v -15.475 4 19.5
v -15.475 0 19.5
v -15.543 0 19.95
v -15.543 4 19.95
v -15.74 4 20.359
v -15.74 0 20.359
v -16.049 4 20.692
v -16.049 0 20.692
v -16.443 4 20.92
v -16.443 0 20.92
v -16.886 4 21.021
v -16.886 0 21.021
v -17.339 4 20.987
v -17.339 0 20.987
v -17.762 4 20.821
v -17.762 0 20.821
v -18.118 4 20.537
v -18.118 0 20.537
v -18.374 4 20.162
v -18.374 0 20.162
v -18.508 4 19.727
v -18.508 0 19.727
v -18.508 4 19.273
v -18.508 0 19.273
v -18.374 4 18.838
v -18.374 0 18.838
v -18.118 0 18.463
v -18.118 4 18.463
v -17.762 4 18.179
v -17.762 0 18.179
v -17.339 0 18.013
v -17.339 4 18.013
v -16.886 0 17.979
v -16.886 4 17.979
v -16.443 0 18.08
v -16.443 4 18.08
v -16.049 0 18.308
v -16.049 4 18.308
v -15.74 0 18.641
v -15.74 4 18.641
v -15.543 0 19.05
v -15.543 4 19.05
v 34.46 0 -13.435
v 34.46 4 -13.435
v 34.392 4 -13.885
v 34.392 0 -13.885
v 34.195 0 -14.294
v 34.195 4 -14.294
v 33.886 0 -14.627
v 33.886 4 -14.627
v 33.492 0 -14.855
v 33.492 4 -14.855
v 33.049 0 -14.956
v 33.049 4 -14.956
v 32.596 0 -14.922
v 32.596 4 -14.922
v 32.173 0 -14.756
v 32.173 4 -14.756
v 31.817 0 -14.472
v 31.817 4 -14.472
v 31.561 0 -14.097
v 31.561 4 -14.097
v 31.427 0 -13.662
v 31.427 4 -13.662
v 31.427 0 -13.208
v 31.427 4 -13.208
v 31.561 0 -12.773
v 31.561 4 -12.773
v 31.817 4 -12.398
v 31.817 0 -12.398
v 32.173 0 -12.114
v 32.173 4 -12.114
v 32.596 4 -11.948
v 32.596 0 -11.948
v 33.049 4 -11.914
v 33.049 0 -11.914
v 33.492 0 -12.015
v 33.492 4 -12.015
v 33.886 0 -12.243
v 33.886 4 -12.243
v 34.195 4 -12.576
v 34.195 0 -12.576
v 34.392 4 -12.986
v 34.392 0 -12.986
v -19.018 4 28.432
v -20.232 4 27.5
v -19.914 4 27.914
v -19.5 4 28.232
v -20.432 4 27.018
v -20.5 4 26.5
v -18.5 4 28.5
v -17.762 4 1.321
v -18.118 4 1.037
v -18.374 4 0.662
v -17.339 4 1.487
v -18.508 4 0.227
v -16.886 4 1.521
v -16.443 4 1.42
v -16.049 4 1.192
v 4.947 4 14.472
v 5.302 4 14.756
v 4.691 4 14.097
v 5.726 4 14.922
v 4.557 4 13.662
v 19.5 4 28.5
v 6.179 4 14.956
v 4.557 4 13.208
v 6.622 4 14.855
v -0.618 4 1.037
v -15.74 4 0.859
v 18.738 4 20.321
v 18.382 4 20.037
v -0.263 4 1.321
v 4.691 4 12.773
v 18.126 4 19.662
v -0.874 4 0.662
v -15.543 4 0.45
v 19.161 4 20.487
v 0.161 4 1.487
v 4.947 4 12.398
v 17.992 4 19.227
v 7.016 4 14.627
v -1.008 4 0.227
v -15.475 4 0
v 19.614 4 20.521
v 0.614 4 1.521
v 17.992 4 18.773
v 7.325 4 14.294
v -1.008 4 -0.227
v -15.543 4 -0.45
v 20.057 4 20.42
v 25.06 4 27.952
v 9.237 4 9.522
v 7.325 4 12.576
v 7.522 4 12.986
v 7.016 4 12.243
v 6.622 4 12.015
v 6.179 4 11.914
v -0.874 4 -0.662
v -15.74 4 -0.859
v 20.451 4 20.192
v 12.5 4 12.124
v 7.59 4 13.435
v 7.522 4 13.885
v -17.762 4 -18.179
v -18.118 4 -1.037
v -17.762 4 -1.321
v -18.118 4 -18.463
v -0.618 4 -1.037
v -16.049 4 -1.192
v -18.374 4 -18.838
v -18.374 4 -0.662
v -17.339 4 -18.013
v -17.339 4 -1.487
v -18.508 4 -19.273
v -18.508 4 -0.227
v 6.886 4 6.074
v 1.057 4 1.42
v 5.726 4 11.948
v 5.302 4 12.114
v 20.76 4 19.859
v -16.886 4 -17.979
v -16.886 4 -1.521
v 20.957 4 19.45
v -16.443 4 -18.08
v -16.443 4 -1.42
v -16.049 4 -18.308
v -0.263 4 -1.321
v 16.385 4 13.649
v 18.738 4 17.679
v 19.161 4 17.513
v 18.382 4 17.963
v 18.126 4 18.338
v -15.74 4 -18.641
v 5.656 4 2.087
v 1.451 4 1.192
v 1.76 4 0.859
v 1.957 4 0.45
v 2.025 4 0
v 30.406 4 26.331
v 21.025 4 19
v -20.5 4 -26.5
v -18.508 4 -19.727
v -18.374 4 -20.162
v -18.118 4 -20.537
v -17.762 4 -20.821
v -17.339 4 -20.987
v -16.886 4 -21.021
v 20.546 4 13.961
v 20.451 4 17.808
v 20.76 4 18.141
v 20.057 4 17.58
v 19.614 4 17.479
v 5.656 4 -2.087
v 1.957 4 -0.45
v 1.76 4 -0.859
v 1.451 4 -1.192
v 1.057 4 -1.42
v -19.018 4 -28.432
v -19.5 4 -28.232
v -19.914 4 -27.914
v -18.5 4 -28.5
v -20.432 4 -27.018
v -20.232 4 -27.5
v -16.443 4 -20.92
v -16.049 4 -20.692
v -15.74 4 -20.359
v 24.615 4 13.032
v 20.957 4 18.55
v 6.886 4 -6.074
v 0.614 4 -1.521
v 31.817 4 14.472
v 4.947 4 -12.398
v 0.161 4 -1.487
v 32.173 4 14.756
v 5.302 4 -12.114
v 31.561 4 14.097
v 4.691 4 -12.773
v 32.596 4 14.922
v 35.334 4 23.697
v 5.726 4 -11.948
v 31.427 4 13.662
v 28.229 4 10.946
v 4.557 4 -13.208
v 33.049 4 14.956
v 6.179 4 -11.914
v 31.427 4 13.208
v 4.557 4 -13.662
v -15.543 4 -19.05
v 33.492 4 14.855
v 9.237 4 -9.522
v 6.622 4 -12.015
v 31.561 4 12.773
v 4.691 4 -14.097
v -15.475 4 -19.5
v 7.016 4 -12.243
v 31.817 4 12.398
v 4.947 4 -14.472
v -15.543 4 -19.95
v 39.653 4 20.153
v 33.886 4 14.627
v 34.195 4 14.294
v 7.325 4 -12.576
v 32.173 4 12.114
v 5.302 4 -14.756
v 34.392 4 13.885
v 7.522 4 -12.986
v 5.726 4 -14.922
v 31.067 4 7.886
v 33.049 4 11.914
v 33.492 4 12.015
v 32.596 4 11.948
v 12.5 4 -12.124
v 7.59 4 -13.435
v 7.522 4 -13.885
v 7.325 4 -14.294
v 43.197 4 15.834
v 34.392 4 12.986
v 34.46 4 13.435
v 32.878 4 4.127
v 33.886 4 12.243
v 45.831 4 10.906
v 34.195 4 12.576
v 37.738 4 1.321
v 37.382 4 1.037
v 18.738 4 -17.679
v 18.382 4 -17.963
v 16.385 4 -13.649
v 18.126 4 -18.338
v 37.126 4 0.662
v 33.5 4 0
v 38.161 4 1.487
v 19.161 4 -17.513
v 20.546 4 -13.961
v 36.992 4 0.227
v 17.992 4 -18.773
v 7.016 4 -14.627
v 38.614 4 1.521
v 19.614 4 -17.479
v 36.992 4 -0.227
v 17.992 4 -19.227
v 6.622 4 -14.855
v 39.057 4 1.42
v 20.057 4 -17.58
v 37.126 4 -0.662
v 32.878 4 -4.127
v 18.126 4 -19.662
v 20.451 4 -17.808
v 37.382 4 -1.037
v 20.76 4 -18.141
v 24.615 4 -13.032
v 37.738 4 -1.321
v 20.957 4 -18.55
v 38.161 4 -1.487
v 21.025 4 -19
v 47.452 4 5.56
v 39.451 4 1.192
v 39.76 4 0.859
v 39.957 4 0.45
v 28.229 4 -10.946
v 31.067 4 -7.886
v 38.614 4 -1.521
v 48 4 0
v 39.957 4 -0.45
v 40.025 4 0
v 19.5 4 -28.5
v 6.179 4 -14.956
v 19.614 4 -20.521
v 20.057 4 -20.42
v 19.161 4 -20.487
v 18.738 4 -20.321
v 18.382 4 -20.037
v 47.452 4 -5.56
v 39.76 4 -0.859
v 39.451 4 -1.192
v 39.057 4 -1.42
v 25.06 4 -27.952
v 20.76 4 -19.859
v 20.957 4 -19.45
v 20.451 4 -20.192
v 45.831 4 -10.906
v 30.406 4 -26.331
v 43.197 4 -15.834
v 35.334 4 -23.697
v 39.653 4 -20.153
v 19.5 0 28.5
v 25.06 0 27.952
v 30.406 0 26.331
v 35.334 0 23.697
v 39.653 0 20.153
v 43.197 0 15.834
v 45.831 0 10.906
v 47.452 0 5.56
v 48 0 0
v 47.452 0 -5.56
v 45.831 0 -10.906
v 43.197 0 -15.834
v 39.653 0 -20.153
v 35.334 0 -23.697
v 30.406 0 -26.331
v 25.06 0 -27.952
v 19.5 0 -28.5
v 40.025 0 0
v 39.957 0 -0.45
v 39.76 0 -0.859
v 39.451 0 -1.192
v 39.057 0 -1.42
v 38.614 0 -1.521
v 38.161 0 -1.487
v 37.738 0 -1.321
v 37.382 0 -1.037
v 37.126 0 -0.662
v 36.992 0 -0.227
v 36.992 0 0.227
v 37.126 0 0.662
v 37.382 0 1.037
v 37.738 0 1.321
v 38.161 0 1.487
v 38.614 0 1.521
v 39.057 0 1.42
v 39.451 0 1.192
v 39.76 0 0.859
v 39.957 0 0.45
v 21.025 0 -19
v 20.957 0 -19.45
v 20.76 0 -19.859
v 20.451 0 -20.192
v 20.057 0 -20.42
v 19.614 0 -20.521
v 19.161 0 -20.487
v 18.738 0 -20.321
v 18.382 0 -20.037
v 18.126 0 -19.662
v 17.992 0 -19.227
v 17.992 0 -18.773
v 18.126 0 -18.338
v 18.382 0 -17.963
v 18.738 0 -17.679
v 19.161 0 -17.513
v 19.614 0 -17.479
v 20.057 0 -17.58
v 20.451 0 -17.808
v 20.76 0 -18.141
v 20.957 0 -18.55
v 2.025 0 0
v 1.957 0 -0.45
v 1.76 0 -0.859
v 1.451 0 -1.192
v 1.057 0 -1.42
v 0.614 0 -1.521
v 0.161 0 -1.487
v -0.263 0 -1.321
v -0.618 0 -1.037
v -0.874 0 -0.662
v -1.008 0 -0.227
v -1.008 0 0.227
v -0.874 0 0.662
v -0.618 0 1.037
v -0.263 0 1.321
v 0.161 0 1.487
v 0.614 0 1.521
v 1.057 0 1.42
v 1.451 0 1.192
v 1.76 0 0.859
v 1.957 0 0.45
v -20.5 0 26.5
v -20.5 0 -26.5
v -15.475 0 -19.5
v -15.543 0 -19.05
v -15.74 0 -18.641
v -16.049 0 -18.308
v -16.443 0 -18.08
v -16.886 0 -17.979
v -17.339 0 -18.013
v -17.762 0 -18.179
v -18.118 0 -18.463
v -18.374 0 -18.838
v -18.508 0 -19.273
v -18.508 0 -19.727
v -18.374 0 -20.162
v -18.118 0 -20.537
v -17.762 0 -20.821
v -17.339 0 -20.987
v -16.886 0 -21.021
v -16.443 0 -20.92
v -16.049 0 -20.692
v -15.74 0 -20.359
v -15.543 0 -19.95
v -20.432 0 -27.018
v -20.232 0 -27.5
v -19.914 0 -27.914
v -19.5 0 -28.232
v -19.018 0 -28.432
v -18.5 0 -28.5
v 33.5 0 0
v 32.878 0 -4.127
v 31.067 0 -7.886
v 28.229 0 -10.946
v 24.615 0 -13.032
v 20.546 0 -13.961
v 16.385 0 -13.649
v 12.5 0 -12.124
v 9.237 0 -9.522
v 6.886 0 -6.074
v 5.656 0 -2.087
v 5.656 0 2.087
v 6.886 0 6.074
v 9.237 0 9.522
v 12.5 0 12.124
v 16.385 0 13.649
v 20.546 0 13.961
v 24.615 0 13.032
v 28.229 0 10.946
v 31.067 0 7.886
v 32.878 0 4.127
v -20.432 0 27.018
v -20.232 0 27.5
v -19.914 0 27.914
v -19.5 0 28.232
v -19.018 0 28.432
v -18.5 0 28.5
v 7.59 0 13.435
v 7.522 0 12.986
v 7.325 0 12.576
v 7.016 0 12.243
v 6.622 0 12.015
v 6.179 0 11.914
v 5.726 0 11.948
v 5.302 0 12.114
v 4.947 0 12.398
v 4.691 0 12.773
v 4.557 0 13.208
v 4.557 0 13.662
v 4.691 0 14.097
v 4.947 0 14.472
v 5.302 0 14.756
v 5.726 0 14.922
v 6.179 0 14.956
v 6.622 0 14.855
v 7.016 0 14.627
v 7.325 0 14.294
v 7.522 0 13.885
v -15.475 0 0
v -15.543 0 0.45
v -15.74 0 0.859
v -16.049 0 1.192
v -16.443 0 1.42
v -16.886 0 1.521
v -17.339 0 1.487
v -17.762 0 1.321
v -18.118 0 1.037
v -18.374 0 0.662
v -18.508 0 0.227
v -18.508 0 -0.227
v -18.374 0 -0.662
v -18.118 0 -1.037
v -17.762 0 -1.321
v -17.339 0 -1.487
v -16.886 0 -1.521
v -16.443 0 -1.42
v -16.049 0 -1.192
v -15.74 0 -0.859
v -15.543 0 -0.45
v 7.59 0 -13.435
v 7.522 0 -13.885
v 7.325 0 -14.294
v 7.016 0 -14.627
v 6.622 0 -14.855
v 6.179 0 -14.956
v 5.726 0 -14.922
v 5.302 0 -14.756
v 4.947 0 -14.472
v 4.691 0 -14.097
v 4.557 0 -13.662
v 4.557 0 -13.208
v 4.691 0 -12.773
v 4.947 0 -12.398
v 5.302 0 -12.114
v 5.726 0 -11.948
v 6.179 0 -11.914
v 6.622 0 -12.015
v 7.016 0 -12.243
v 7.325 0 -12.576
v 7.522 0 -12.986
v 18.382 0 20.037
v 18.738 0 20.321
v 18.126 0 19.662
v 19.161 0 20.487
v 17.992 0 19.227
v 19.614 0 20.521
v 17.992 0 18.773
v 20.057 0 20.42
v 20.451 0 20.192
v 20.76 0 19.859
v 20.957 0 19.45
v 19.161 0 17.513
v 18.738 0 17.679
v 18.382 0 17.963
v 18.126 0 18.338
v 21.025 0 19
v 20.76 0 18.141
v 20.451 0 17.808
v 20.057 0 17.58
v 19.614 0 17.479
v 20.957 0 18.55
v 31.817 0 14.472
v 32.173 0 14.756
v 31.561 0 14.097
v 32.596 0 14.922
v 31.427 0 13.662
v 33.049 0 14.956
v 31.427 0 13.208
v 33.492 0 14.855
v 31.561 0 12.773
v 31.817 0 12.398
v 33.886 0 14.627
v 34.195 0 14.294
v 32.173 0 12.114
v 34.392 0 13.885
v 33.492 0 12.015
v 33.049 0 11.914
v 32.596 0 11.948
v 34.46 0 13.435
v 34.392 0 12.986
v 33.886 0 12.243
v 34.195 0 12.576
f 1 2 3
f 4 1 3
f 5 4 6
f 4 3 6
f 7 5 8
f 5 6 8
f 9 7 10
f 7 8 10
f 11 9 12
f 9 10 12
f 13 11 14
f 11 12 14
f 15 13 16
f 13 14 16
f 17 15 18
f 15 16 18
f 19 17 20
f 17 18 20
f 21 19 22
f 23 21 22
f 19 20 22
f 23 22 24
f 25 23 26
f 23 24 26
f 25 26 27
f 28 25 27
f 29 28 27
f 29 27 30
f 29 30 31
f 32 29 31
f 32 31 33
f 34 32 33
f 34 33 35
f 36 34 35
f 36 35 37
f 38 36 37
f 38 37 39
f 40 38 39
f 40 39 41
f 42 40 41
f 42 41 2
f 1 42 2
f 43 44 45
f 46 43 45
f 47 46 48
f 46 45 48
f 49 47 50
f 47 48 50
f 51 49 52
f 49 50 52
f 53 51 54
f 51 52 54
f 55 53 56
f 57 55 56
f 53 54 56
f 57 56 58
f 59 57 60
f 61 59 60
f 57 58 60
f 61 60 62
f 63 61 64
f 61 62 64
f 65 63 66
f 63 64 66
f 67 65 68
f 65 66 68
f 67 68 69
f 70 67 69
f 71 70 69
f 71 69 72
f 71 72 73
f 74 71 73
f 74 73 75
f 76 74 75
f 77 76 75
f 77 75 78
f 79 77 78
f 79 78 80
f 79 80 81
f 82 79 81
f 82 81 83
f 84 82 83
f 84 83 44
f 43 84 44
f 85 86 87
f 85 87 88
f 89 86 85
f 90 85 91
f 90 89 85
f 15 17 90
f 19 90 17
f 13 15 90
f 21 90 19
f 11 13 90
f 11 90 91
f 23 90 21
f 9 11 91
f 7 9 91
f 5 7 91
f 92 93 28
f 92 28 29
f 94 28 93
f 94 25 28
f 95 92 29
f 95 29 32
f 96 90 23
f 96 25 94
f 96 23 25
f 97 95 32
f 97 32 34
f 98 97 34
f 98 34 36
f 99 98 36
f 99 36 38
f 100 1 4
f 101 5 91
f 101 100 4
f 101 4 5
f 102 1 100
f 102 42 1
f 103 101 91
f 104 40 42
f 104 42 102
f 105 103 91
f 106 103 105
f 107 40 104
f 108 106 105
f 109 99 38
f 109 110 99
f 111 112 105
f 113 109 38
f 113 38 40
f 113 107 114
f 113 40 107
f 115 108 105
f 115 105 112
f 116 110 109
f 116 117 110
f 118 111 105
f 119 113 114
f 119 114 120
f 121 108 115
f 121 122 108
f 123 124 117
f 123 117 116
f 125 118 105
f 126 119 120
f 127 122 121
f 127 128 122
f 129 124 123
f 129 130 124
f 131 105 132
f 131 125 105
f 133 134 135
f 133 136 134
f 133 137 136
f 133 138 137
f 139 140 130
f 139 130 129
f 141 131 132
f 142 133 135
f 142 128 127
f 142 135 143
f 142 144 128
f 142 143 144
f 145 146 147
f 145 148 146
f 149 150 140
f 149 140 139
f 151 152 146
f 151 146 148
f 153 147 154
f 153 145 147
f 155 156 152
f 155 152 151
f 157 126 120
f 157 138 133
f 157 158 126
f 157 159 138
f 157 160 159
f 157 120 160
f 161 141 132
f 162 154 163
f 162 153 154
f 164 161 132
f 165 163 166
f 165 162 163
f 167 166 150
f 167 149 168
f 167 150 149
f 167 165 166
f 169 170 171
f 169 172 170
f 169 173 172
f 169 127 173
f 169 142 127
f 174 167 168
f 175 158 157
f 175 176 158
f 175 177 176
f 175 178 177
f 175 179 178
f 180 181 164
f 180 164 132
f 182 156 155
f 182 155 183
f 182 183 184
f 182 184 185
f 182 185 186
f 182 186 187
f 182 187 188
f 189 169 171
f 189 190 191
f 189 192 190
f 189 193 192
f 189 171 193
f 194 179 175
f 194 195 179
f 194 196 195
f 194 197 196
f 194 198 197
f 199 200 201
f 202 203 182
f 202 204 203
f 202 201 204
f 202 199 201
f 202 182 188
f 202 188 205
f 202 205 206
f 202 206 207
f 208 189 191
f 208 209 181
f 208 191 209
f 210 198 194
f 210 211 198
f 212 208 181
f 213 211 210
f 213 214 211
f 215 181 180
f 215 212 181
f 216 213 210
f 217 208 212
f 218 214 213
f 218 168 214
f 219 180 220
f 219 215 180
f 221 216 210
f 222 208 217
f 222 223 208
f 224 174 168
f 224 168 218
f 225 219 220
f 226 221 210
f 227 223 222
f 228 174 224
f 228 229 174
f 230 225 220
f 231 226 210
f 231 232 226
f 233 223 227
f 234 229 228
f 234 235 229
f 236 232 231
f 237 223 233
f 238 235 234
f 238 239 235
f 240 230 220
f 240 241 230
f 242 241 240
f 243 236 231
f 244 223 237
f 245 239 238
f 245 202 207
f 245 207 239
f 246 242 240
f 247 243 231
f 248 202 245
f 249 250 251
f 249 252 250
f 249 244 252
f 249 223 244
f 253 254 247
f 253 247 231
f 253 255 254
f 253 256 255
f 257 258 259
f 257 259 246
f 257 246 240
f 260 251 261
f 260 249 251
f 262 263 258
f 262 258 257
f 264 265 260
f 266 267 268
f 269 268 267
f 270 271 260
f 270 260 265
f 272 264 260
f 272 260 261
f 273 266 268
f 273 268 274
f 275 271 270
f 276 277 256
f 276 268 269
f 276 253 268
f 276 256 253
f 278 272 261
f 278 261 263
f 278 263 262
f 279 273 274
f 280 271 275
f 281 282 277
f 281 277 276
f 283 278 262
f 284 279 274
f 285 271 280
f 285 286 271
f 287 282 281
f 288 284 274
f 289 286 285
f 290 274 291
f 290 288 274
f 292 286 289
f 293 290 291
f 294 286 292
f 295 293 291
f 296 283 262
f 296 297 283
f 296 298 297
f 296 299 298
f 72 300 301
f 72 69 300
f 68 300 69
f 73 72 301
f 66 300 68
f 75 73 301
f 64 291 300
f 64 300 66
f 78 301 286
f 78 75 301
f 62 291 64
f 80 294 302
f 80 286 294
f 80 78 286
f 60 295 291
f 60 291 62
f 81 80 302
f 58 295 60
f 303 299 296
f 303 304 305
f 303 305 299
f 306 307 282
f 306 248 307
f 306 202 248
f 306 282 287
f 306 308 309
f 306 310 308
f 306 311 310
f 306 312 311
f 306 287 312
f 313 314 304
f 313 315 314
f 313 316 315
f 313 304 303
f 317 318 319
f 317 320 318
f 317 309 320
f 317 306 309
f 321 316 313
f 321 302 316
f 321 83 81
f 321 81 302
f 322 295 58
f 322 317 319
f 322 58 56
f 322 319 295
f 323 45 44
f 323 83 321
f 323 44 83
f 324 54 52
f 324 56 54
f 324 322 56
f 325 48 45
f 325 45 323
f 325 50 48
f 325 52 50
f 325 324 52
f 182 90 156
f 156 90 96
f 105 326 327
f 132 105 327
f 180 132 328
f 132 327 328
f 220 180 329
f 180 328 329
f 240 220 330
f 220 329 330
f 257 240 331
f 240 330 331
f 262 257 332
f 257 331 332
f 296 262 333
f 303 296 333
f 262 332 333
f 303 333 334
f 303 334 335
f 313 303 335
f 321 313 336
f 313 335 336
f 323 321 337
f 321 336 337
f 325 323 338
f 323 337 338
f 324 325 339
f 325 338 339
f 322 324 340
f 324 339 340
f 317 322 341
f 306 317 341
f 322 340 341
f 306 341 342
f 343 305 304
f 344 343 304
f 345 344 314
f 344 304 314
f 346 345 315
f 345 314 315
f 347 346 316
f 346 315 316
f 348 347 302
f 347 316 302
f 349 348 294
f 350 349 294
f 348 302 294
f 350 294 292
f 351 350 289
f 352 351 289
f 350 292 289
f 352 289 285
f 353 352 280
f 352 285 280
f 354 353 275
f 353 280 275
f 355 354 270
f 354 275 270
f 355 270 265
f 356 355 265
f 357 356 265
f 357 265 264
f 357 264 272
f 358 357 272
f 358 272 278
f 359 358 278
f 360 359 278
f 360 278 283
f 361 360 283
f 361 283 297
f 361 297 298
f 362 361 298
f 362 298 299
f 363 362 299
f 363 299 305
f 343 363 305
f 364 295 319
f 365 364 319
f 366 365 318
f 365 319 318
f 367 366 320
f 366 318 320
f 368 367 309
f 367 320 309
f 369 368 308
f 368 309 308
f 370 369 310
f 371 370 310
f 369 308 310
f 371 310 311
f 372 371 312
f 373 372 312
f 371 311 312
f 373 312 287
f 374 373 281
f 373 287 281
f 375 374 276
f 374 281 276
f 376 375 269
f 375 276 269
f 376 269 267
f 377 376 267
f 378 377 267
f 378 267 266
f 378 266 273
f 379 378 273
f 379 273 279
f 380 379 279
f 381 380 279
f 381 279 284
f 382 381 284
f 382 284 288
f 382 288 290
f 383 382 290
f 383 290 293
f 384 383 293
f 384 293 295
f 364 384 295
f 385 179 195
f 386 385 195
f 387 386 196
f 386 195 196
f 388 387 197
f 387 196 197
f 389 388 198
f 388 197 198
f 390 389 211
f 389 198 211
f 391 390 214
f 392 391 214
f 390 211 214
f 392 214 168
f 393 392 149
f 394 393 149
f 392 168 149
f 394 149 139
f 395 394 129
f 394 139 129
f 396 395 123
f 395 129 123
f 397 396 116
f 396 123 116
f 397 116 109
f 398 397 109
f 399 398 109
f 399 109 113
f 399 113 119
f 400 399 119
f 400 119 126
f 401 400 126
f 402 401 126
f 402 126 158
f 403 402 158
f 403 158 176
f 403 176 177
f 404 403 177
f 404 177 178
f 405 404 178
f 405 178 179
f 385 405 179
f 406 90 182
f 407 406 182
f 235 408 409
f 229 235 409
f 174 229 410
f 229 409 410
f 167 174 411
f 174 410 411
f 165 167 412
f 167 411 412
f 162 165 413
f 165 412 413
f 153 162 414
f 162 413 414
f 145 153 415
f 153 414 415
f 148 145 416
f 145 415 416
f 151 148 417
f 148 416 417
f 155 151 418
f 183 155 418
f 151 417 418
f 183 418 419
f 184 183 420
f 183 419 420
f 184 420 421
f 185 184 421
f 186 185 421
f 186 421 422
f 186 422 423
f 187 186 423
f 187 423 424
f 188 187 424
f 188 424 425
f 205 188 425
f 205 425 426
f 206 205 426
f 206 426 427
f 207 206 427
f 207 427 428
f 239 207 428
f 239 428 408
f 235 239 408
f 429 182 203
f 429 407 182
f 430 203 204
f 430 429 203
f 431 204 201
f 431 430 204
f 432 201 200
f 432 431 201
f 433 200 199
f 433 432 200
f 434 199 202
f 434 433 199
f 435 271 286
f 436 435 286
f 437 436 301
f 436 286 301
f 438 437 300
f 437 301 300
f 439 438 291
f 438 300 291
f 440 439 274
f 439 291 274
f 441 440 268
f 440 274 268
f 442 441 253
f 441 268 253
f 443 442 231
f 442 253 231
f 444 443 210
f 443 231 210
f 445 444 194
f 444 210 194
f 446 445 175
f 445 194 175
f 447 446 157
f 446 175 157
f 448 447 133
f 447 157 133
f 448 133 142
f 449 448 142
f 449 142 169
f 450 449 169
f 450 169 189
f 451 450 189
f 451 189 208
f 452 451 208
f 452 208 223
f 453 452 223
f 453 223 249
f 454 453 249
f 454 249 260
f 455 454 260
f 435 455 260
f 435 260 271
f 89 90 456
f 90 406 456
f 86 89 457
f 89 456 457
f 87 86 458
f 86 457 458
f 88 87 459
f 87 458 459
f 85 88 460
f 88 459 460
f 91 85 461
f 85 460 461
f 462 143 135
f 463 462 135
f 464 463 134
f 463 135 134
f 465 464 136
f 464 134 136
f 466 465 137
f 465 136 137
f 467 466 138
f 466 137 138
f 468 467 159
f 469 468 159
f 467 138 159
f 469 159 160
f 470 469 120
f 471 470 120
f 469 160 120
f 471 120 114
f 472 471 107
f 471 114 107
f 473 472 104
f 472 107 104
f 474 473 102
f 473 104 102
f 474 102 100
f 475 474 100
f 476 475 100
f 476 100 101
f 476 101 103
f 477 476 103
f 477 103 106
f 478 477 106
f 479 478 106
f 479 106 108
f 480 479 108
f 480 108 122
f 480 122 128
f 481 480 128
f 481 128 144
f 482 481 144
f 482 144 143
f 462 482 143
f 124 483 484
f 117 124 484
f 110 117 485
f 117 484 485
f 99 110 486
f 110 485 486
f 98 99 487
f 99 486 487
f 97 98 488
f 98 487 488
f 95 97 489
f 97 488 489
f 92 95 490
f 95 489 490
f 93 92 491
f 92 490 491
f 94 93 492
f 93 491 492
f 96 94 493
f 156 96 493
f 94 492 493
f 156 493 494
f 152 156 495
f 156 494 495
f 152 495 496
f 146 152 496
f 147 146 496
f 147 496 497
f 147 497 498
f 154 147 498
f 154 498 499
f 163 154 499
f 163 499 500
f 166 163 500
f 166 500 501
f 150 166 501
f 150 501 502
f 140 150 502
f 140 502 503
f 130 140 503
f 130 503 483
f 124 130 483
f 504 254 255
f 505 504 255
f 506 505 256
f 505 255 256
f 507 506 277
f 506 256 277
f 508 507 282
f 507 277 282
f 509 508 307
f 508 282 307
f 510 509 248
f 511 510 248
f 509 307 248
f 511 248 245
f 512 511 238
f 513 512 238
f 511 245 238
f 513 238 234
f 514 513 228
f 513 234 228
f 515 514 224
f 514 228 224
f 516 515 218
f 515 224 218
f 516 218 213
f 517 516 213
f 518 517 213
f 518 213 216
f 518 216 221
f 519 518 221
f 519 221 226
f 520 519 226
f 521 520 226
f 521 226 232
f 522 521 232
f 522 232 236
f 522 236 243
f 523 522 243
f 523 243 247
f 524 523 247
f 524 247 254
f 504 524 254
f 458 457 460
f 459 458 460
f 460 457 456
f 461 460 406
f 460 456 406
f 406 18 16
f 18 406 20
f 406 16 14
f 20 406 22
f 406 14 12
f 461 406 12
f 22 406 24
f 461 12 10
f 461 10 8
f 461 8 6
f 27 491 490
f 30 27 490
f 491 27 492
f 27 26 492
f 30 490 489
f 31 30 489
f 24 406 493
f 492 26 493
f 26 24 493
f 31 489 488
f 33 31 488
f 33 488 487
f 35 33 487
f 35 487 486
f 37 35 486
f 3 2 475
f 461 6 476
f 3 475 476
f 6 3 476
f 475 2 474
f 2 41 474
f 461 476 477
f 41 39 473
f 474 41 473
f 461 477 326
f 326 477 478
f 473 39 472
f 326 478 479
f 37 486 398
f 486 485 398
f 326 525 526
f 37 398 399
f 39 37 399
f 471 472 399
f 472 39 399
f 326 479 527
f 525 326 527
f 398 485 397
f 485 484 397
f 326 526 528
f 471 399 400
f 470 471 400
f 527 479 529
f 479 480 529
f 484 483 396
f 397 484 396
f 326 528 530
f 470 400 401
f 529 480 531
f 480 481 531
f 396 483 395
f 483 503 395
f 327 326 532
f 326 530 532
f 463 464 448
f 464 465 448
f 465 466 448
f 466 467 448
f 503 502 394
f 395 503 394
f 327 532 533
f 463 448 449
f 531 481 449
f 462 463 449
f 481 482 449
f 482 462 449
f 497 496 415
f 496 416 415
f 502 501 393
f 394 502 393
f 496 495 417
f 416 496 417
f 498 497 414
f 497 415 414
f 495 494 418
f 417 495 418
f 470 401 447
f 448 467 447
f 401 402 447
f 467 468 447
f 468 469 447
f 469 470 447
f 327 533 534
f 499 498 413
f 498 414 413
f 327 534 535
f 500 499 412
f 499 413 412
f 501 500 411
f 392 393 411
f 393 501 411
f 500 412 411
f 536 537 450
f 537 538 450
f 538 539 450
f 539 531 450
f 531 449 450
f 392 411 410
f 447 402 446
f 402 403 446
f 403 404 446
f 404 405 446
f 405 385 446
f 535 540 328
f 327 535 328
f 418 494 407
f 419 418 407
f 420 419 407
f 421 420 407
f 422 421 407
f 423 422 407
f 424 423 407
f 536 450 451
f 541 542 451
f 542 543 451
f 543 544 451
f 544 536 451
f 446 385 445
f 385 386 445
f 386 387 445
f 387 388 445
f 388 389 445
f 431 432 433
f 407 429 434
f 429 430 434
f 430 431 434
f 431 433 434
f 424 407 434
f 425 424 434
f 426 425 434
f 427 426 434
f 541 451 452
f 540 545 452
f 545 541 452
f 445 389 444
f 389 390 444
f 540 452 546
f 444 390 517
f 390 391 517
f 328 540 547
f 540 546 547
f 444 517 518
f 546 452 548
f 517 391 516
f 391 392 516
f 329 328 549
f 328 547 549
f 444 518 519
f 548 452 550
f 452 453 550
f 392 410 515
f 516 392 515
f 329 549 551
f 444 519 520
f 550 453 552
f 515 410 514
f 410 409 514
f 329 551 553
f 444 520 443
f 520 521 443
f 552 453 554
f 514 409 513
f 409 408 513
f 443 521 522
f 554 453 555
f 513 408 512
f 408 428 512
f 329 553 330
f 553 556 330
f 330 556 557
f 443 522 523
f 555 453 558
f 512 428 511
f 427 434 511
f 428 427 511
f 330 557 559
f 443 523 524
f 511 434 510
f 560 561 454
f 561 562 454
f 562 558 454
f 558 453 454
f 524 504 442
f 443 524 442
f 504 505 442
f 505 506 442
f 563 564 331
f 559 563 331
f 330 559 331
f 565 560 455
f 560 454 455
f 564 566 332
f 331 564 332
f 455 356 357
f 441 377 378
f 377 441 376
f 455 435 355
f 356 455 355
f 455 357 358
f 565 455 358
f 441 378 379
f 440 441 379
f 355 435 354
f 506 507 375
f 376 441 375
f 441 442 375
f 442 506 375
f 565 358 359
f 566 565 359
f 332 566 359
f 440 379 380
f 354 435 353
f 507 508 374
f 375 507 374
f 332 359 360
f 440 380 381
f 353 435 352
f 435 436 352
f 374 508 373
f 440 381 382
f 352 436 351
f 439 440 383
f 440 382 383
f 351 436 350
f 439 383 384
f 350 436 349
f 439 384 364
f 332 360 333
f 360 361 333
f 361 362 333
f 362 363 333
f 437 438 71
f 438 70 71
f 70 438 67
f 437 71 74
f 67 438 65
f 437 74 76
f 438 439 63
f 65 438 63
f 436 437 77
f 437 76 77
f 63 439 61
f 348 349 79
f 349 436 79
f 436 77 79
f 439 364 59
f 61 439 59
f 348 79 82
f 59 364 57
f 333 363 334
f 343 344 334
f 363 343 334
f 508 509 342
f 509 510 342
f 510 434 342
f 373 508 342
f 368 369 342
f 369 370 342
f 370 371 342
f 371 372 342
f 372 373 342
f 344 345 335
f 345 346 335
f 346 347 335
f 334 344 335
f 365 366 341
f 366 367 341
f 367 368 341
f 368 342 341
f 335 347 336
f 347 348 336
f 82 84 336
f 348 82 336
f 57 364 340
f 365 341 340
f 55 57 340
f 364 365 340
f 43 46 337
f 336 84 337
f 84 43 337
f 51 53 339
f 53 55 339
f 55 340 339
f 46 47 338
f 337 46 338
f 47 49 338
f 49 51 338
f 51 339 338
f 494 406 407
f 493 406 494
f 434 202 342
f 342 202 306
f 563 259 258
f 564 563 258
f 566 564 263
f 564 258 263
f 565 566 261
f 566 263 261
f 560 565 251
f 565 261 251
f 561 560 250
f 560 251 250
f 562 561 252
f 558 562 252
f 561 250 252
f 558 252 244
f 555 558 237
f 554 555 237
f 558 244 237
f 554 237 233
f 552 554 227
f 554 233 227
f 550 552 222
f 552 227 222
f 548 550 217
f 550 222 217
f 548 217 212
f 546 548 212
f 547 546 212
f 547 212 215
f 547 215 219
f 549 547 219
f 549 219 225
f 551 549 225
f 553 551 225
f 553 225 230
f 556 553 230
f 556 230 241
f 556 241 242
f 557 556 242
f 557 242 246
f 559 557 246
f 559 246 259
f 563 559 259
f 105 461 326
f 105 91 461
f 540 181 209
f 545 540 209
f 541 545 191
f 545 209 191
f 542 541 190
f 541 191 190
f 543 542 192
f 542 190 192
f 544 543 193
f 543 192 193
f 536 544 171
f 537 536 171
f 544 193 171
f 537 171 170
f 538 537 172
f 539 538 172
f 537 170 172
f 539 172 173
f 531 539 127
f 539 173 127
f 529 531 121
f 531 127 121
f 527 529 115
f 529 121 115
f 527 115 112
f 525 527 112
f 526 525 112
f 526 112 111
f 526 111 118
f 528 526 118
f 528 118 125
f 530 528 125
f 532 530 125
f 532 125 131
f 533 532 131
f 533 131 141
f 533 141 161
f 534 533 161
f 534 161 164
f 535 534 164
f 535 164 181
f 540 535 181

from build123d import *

# Parameters (mm, degrees)
EXTRUDE_1_DEPTH     = 4
SKETCH_3_R          = 1.525
CUT_EXTRUDE_1_DEPTH = 5
SKETCH_4_R          = 14
CUT_EXTRUDE_2_DEPTH = 5
SKETCH_7_R          = 1.525
CUT_EXTRUDE_4_DEPTH = 5
SKETCH_8_W          = 1
SKETCH_8_H          = 57
EXTRUDE_2_DEPTH     = 4
FILLET_1_R          = 2


with BuildPart() as part:
    # 草图1 → 凸台-拉伸1 (new body)
    with BuildSketch(Plane(origin=(0, 0, 0), x_dir=(1, 0, 0), z_dir=(0, 1, 0))):
        with BuildLine():
            ThreePointArc((19.5, 28.5), (-9, 0), (19.5, -28.5))
            Line((19.5, -28.5), (19.5, 28.5))
        make_face()
        with BuildLine():
            Line((19.5, 28.5), (19.5, -28.5))
            ThreePointArc((19.5, -28.5), (39.652543264, -20.152543264), (48, 0))
            ThreePointArc((48, 0), (39.652543264, 20.152543264), (19.5, 28.5))
        make_face()
        with BuildLine():
            Line((-19.5, 28.5), (-19.5, -28.5))
            Line((-19.5, -28.5), (19.5, -28.5))
            ThreePointArc((19.5, -28.5), (-9, 0), (19.5, 28.5))
            Line((19.5, 28.5), (-19.5, 28.5))
        make_face()
    extrude(amount=EXTRUDE_1_DEPTH)

    # 草图3 → 切除-拉伸1 (cut, through all)
    with BuildSketch(Plane(origin=(0, 4, 0), x_dir=(1, 0, 0), z_dir=(0, 1, 0))):
        with Locations((32.935028843, 13.435028843)):
            Circle(SKETCH_3_R)
        with Locations((32.935028843, -13.435028843)):
            Circle(SKETCH_3_R)
        with Locations((6.064971157, -13.435028843)):
            Circle(SKETCH_3_R)
        with Locations((6.064971157, 13.435028843)):
            Circle(SKETCH_3_R)
        with Locations((38.5, 0)):
            Circle(SKETCH_3_R)
        with Locations((19.5, -19)):
            Circle(SKETCH_3_R)
        with Locations((0.5, 0)):
            Circle(SKETCH_3_R)
        with Locations((19.5, 19)):
            Circle(SKETCH_3_R)
    extrude(amount=-CUT_EXTRUDE_1_DEPTH, mode=Mode.SUBTRACT)

    # 草图4 → 切除-拉伸2 (cut, through all)
    with BuildSketch(Plane(origin=(0, 4, 0), x_dir=(1, 0, 0), z_dir=(0, 1, 0))):
        with Locations((19.5, 0)):
            Circle(SKETCH_4_R)
    extrude(amount=-CUT_EXTRUDE_2_DEPTH, mode=Mode.SUBTRACT)

    # 草图7 → 切除-拉伸4 (cut, through all)
    with BuildSketch(Plane.XZ):
        with Locations((-17, 0)):
            Circle(SKETCH_7_R)
        with Locations((-17, 19.5)):
            Circle(SKETCH_7_R)
        with Locations((-17, -19.5)):
            Circle(SKETCH_7_R)
    extrude(amount=-CUT_EXTRUDE_4_DEPTH, mode=Mode.SUBTRACT)

    # 草图8 → 凸台-拉伸2 (add)
    with BuildSketch(Plane(origin=(0, 4, 0), x_dir=(1, 0, 0), z_dir=(0, 1, 0))):
        with Locations((-20, 0)):
            Rectangle(SKETCH_8_W, SKETCH_8_H)
    extrude(amount=-EXTRUDE_2_DEPTH)

    # 圆角1
    fillet_1_edges = [part.edges().sort_by_distance(p)[0] for p in [
        (-20.5, 2, 28.5),
        (-20.5, 2, -28.5),
    ]]
    fillet(fillet_1_edges, radius=FILLET_1_R)


solid = part.part
